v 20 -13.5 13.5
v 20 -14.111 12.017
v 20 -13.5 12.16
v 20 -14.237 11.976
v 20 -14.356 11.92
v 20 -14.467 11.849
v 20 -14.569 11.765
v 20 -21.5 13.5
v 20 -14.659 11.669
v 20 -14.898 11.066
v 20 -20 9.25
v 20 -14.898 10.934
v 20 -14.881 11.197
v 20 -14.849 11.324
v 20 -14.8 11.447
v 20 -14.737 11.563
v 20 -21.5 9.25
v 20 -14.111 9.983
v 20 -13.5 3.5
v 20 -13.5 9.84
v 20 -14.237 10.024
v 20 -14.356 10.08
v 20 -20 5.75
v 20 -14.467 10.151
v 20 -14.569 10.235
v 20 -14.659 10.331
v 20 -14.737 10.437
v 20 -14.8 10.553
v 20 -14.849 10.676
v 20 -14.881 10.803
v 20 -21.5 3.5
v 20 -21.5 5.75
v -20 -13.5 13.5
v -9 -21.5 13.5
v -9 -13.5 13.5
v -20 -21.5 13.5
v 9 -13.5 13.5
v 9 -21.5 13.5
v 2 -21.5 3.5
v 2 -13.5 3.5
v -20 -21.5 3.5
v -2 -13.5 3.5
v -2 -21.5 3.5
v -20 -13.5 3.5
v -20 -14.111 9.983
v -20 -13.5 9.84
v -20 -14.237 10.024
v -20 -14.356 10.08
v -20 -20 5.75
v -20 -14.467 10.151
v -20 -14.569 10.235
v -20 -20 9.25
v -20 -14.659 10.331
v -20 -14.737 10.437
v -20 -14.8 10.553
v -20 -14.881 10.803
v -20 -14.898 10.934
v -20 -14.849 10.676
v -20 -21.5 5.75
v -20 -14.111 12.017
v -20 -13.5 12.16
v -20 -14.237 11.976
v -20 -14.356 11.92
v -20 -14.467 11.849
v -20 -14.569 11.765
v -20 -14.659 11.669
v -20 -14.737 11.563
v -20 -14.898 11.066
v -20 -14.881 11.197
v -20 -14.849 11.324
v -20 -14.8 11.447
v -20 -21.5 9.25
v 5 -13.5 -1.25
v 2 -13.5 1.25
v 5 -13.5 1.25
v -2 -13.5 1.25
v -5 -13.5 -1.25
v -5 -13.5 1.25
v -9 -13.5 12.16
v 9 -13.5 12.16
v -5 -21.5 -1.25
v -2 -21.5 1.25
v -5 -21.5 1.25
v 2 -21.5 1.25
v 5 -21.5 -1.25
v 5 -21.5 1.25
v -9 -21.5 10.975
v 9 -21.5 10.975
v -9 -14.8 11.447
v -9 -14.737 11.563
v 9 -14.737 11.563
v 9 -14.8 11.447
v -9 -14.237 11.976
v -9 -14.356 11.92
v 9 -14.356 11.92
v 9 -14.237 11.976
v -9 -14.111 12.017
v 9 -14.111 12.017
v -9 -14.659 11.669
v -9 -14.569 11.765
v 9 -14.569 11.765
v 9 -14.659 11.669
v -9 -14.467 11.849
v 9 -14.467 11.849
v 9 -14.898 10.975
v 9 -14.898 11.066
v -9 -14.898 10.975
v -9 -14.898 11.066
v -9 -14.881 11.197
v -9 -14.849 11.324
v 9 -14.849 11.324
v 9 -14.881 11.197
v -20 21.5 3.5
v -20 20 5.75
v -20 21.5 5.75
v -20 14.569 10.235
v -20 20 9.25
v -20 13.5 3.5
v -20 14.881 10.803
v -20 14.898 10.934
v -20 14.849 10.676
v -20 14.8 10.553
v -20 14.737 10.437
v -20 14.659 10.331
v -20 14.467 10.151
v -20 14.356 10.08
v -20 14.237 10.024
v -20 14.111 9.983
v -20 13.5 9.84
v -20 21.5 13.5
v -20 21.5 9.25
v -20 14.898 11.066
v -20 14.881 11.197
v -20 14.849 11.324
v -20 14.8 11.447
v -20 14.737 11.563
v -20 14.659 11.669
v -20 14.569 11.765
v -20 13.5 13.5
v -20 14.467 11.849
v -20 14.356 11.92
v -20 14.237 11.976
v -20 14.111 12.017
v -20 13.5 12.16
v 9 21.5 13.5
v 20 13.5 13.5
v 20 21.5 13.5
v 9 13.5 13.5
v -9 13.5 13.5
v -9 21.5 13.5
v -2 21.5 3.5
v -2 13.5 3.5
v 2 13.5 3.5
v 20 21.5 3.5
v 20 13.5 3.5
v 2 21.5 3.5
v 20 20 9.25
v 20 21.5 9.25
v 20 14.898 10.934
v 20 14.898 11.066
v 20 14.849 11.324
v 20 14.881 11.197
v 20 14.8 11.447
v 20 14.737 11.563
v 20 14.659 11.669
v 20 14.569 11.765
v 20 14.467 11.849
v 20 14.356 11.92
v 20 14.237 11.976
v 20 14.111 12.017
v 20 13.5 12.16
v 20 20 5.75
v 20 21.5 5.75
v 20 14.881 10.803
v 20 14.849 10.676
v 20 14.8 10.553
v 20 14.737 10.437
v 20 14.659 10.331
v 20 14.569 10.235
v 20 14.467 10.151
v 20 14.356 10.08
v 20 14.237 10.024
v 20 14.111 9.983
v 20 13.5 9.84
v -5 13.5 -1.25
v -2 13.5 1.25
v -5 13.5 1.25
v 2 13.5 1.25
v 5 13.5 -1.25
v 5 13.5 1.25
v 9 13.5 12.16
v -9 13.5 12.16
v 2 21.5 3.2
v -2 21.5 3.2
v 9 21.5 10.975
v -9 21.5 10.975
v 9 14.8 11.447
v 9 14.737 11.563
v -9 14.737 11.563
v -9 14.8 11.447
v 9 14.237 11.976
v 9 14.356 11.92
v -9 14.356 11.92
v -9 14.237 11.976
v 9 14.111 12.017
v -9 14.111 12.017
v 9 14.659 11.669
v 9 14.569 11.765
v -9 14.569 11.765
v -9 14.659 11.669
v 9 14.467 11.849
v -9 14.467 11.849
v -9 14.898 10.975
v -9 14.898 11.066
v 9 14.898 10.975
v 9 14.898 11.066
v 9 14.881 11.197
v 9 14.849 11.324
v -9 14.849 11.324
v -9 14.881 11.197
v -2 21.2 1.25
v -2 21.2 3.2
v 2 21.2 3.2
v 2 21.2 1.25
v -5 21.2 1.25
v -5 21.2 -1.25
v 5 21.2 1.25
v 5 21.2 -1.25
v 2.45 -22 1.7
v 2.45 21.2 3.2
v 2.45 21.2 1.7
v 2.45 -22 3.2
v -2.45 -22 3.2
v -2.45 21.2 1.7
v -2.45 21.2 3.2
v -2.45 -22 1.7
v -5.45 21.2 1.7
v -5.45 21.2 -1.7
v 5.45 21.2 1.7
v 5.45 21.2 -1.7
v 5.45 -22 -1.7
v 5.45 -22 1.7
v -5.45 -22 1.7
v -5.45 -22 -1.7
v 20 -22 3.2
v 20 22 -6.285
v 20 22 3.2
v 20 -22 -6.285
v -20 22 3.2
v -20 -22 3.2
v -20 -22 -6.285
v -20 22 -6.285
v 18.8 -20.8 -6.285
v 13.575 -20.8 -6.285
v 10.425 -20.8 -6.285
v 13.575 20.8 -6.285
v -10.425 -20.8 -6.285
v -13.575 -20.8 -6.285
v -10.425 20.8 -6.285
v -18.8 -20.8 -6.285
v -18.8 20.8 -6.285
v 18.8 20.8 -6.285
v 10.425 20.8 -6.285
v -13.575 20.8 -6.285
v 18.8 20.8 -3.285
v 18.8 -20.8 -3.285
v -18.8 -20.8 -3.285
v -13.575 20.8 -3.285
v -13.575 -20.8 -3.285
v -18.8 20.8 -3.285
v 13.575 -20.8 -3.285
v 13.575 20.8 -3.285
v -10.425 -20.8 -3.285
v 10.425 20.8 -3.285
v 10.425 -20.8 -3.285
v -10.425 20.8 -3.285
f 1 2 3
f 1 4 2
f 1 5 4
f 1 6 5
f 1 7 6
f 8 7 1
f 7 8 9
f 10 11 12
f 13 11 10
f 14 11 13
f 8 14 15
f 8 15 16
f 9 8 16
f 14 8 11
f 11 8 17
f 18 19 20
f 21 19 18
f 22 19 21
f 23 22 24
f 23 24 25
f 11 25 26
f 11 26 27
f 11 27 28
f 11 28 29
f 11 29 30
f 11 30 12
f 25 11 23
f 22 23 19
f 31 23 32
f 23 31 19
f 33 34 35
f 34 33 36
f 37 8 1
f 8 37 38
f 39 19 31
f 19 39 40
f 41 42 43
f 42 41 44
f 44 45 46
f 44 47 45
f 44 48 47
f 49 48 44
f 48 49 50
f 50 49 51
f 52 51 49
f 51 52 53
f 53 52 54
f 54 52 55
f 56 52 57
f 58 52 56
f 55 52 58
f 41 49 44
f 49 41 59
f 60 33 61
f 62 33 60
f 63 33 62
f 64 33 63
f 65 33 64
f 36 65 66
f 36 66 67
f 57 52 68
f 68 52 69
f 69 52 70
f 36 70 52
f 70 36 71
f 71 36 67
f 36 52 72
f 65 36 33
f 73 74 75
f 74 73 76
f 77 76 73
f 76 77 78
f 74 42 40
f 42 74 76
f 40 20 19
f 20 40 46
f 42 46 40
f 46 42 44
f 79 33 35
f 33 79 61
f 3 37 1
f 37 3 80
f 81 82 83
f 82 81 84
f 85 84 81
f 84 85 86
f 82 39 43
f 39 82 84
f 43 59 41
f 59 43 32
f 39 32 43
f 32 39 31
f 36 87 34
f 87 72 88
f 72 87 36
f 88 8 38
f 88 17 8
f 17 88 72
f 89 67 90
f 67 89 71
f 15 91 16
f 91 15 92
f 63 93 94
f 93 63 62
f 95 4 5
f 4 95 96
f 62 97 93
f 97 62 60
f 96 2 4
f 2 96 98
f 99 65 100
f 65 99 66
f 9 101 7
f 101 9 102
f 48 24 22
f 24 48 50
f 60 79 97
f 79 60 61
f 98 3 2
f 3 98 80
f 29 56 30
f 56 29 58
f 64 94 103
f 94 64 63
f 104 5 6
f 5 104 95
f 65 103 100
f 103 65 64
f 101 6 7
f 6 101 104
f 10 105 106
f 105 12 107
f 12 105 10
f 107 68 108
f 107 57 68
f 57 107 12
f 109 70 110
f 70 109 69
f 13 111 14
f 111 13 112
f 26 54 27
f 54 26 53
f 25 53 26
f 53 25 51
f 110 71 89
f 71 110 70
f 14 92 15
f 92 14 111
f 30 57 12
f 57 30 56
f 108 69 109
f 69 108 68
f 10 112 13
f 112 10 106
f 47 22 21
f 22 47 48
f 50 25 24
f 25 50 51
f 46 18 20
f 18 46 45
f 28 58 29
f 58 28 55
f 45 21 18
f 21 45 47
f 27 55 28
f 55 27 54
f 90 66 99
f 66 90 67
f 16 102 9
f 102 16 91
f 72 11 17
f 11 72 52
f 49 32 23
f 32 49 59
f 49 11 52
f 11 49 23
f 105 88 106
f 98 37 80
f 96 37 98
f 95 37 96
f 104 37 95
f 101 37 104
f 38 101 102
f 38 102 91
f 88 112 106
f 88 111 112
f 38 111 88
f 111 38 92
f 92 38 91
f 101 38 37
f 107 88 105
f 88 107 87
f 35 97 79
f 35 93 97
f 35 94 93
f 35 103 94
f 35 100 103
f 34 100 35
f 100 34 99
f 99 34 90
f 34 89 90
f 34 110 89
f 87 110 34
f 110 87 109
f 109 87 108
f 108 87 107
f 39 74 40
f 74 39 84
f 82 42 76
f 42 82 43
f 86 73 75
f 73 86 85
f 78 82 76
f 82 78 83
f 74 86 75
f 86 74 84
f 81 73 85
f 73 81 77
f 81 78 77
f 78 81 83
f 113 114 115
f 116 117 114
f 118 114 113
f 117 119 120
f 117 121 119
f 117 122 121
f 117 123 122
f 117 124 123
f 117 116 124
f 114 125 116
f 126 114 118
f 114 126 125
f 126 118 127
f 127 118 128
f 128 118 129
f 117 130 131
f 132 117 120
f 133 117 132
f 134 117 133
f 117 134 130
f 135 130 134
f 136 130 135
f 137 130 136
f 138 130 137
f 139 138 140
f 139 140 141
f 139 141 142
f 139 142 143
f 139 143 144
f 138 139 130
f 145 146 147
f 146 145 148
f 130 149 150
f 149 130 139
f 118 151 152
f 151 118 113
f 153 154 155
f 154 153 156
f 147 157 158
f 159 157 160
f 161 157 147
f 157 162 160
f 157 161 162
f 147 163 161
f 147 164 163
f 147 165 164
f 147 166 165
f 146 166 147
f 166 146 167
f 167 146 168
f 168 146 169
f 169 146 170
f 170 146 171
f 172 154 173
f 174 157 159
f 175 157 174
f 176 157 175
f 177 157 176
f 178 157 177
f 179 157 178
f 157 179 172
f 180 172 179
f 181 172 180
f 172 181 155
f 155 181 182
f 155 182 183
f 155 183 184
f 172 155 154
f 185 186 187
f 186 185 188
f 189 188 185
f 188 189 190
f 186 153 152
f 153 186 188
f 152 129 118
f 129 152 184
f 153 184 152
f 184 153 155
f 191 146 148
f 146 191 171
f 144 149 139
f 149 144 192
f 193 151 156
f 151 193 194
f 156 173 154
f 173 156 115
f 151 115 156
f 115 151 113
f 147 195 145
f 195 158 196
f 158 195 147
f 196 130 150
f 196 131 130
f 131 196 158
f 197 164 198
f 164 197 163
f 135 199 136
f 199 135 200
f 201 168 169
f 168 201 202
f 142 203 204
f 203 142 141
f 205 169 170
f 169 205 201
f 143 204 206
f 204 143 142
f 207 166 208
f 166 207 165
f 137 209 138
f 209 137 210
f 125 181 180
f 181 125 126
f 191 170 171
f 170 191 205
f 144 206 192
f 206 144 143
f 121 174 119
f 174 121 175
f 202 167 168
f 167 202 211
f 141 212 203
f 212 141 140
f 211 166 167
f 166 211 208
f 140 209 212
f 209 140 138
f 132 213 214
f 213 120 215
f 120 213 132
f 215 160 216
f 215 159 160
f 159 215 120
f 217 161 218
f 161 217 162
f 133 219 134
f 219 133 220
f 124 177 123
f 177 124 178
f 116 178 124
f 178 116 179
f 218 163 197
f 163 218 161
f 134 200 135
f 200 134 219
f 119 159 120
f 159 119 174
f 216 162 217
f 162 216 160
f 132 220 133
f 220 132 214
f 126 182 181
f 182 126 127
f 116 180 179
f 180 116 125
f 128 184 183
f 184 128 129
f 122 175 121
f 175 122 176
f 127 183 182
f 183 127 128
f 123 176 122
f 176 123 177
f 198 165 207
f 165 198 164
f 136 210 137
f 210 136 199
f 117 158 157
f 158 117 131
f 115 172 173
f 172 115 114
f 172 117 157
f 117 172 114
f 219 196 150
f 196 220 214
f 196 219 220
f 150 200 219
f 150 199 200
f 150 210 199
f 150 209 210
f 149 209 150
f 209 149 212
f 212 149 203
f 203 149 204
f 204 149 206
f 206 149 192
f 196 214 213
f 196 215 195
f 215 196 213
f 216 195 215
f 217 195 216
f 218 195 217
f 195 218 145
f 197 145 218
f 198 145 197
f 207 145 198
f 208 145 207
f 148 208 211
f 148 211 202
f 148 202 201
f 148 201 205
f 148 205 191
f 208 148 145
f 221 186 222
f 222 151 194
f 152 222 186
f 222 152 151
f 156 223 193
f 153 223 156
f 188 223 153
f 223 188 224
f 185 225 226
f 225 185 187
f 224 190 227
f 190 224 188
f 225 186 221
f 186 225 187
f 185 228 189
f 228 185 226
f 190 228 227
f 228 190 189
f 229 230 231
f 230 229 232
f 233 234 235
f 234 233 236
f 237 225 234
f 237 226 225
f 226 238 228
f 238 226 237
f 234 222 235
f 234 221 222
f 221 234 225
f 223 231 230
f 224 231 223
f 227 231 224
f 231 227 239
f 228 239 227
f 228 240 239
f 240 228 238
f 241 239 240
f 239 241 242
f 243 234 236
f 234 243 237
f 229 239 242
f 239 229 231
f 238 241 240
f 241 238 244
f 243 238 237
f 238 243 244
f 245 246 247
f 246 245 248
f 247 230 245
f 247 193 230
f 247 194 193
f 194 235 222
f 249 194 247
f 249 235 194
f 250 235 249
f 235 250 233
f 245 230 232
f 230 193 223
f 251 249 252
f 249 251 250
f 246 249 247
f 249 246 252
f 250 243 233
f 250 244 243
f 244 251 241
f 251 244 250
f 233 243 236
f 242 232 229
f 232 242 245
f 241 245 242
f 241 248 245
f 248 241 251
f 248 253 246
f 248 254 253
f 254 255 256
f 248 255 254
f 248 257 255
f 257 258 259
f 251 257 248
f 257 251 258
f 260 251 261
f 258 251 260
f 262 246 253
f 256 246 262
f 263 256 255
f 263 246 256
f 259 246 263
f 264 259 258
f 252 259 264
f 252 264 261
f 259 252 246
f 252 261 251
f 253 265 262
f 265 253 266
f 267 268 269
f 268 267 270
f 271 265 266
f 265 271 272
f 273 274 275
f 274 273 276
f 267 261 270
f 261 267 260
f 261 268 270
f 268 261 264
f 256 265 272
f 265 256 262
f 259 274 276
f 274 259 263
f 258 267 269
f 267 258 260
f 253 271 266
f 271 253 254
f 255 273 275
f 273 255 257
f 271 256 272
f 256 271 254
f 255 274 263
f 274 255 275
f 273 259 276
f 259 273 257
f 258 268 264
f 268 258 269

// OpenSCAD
/*
 * Component Holder.scad
 *
 *
 * NOTES:
 *
 * There are two different parts, the Track (with LEGO compatible fittings
 * on the bottom) and the Jaws which slide in the groove of the track and 
 * are held tight using a rubber band.
 *
 * You will need to print one track and two jaws.
 *
 * The track should be printed standing on end, and the jaws should be 
 * printed face down (with the curved PCB groove) on the bed.
 *
 * INSTRUCTIONS:
 *
 * 1. In the RENDER section set beautyRender to 1 and the rest to 0
 * 
 * 2. In SETTINGS set componentX and componentY to the size of the 
 *    PCB of the component you will be using.
 *
 * 3. In SETTINGS adjust brickX and brickY to be sized appropriately 
 *    to fit the component you added in the first step.
 * 
 * 4. If needed, change slotWidth to a number above 0 to accommodate 
 *    elements that may need clearance on the jaws.
 * 
 * 5. In the RENDER section set only trackRender to 1 and then export
 *    that, and then do the same for jawRender.
 *
 * 
 * Pete Prodoehl <pete@browndoggadgets.com>
 *
 */


/* --- SETTIINGS ---------------------------------------------------------------------------- */

// set the size of the component
componentX = 42;
componentY = 24;

// adjust for the size you need to hold the component
brickX = 5;
brickY = 5.5;

// do not change these values
trackWidth  = brickX * 8;   // do not change
trackLength = brickY * 8;   // do not change
trackHeight = 5.5;          // do not change
trackMidX   = 4;            // do not change
trackMidZ   = 5;            // do not change
trackBotX   = 10;           // do not change
trackBotZ   = 2.5;          // do not change

// adjust if desired to change the width of the jaws
jawWidth = trackWidth;

// adjusting only affects preview of jaws if needed
jawPreviewSpace = 4.5;  // default to 4.5

// add a slot in the jaw for some components if needed
slotWidth = 18; // set to 0 for no slot

$fn=50;


/* --- RENDER ------------------------------------------------------------------------------- */


// toggle these to affect the preview and rendering
trackRender  = 0;
jawRender    = 0;
beautyRender = 1;



// render commands
if (jawRender) {
	translate([0,0,0/2]) jawPart();
}
if (trackRender) {
	translate([0,0,0/2]) trackPart();
}
if (beautyRender) {
	translate([0,-trackLength/2+jawPreviewSpace,0]) rotate([0,0,0])   color("#0066FF") jawPart();
	translate([0,+trackLength/2-jawPreviewSpace,0]) rotate([0,0,180]) color("#0066FF") jawPart();
	translate([0,0,0]) color("#99AA00") trackPart();
	%translate([0,0,11]) cube([componentX,componentY,1.6], center=true); // component size here
}



/* --- MODULES ------------------------------------------------------------------------------ */

// jawPart is the jaws which hold the component...
//
module jawPart() {

    difference() {
        
        // top of jaw with PCB and rubber band slot cutouts
        translate([0,0,8.5])
            cube([jawWidth,8,10], center=true);
            
        // PCB slot
        hull() {
        
            translate([0,4.75,11])
                rotate([0,90,0])
                    cylinder(d=2.6, h=jawWidth+0.01, center=true);

            translate([0,3.65,11])
                rotate([0,90,0])
                    cylinder(d=2.1, h=jawWidth+0.01, center=true);                
                
        }
            
        // rubber band slot
        translate([0,-4.5,7.5])
            cube([jawWidth+0.01,4,3.5], center=true);
            
        // slot if included
        translate([0,0,13.85])
            cube([slotWidth,10,5.75], center=true);
      
    }

	// inverted T at the bottom of the jaw
    translate([0,0,0])
        guidePart();

}

/* ------------------------------------------------------------------------------------------ */

// trackPart is the basic track sized as specified
// with the guideSlot cut out from it...
//
module trackPart() {
    
    difference() {

        translate([0,0,-trackHeight/2+3.2])
            cube([trackWidth,trackLength,trackHeight], center=true);
            
        translate([0,-0.8,0])
           guideSlot();

    }
    
    // LEGO compatible bottom portion
    translate([0,0,-4.285])
        Lego_Maker(brickY, brickX);
	
} // end trackPart

/* ------------------------------------------------------------------------------------------ */

// guidePart is the inverted T at the bottom of the jaw that fits into the slot/groove
// in the trackPart which gets created by cutting out the guideSlot...
//
module guidePart() {

    variance = 0;
    trackLength = 8; 

    // middle
    translate([0,0,3])
        color("#00FF33")
            cube([trackMidX+variance,trackLength,trackMidZ+variance], center=true);
    
    // bottom
    translate([0,0,0])
        color("#33AA66")
            cube([trackBotX+variance,trackLength,trackBotZ+variance], center=true);
        
}  // end guidePart

/* ------------------------------------------------------------------------------------------ */

// guideSlot is the cutout part from the trackPart which creates the slot/groove 
// that the guidePart fits into and slides in...
//
module guideSlot() {
    
    variance = 0.9;
    
    // middle
    translate([0,0,3])
        color("#996600")
            cube([trackMidX+variance,trackLength,trackMidZ+variance], center=true);
            
    // bottom
    translate([0,0,0])
        color("#999900")
            cube([trackBotX+variance,trackLength,trackBotZ+variance], center=true);
        
}  // end guideSlot

/* ------------------------------------------------------------------------------------------ */

// Lego_Maker creates the modified LEGO brick-like part at the bottom of the holder...
//
module Lego_Maker(width, length) {

	unit_height   = 4;    // height of main brick
	unit_width    = 8;    // width of one LEGO Unit
    wall_width_x2 = 3.15; // double wall width
    
    difference() {
    
        translate([0,0,0])
            cube([length*unit_width, width*unit_width, unit_height], center=true);
    
        translate([0,0,-1])
            cube([length*unit_width-2.4, width*unit_width-2.4, unit_height], center=true);

    }
    
    translate([trackWidth/2-unit_width,0,0])
        cube([wall_width_x2, width*unit_width, unit_height], center=true);
        
    translate([-trackWidth/2+unit_width,0,0])
        cube([wall_width_x2, width*unit_width, unit_height], center=true);

}  // end Lego_Maker

/* ------------------------------------------------------------------------------------------ */
